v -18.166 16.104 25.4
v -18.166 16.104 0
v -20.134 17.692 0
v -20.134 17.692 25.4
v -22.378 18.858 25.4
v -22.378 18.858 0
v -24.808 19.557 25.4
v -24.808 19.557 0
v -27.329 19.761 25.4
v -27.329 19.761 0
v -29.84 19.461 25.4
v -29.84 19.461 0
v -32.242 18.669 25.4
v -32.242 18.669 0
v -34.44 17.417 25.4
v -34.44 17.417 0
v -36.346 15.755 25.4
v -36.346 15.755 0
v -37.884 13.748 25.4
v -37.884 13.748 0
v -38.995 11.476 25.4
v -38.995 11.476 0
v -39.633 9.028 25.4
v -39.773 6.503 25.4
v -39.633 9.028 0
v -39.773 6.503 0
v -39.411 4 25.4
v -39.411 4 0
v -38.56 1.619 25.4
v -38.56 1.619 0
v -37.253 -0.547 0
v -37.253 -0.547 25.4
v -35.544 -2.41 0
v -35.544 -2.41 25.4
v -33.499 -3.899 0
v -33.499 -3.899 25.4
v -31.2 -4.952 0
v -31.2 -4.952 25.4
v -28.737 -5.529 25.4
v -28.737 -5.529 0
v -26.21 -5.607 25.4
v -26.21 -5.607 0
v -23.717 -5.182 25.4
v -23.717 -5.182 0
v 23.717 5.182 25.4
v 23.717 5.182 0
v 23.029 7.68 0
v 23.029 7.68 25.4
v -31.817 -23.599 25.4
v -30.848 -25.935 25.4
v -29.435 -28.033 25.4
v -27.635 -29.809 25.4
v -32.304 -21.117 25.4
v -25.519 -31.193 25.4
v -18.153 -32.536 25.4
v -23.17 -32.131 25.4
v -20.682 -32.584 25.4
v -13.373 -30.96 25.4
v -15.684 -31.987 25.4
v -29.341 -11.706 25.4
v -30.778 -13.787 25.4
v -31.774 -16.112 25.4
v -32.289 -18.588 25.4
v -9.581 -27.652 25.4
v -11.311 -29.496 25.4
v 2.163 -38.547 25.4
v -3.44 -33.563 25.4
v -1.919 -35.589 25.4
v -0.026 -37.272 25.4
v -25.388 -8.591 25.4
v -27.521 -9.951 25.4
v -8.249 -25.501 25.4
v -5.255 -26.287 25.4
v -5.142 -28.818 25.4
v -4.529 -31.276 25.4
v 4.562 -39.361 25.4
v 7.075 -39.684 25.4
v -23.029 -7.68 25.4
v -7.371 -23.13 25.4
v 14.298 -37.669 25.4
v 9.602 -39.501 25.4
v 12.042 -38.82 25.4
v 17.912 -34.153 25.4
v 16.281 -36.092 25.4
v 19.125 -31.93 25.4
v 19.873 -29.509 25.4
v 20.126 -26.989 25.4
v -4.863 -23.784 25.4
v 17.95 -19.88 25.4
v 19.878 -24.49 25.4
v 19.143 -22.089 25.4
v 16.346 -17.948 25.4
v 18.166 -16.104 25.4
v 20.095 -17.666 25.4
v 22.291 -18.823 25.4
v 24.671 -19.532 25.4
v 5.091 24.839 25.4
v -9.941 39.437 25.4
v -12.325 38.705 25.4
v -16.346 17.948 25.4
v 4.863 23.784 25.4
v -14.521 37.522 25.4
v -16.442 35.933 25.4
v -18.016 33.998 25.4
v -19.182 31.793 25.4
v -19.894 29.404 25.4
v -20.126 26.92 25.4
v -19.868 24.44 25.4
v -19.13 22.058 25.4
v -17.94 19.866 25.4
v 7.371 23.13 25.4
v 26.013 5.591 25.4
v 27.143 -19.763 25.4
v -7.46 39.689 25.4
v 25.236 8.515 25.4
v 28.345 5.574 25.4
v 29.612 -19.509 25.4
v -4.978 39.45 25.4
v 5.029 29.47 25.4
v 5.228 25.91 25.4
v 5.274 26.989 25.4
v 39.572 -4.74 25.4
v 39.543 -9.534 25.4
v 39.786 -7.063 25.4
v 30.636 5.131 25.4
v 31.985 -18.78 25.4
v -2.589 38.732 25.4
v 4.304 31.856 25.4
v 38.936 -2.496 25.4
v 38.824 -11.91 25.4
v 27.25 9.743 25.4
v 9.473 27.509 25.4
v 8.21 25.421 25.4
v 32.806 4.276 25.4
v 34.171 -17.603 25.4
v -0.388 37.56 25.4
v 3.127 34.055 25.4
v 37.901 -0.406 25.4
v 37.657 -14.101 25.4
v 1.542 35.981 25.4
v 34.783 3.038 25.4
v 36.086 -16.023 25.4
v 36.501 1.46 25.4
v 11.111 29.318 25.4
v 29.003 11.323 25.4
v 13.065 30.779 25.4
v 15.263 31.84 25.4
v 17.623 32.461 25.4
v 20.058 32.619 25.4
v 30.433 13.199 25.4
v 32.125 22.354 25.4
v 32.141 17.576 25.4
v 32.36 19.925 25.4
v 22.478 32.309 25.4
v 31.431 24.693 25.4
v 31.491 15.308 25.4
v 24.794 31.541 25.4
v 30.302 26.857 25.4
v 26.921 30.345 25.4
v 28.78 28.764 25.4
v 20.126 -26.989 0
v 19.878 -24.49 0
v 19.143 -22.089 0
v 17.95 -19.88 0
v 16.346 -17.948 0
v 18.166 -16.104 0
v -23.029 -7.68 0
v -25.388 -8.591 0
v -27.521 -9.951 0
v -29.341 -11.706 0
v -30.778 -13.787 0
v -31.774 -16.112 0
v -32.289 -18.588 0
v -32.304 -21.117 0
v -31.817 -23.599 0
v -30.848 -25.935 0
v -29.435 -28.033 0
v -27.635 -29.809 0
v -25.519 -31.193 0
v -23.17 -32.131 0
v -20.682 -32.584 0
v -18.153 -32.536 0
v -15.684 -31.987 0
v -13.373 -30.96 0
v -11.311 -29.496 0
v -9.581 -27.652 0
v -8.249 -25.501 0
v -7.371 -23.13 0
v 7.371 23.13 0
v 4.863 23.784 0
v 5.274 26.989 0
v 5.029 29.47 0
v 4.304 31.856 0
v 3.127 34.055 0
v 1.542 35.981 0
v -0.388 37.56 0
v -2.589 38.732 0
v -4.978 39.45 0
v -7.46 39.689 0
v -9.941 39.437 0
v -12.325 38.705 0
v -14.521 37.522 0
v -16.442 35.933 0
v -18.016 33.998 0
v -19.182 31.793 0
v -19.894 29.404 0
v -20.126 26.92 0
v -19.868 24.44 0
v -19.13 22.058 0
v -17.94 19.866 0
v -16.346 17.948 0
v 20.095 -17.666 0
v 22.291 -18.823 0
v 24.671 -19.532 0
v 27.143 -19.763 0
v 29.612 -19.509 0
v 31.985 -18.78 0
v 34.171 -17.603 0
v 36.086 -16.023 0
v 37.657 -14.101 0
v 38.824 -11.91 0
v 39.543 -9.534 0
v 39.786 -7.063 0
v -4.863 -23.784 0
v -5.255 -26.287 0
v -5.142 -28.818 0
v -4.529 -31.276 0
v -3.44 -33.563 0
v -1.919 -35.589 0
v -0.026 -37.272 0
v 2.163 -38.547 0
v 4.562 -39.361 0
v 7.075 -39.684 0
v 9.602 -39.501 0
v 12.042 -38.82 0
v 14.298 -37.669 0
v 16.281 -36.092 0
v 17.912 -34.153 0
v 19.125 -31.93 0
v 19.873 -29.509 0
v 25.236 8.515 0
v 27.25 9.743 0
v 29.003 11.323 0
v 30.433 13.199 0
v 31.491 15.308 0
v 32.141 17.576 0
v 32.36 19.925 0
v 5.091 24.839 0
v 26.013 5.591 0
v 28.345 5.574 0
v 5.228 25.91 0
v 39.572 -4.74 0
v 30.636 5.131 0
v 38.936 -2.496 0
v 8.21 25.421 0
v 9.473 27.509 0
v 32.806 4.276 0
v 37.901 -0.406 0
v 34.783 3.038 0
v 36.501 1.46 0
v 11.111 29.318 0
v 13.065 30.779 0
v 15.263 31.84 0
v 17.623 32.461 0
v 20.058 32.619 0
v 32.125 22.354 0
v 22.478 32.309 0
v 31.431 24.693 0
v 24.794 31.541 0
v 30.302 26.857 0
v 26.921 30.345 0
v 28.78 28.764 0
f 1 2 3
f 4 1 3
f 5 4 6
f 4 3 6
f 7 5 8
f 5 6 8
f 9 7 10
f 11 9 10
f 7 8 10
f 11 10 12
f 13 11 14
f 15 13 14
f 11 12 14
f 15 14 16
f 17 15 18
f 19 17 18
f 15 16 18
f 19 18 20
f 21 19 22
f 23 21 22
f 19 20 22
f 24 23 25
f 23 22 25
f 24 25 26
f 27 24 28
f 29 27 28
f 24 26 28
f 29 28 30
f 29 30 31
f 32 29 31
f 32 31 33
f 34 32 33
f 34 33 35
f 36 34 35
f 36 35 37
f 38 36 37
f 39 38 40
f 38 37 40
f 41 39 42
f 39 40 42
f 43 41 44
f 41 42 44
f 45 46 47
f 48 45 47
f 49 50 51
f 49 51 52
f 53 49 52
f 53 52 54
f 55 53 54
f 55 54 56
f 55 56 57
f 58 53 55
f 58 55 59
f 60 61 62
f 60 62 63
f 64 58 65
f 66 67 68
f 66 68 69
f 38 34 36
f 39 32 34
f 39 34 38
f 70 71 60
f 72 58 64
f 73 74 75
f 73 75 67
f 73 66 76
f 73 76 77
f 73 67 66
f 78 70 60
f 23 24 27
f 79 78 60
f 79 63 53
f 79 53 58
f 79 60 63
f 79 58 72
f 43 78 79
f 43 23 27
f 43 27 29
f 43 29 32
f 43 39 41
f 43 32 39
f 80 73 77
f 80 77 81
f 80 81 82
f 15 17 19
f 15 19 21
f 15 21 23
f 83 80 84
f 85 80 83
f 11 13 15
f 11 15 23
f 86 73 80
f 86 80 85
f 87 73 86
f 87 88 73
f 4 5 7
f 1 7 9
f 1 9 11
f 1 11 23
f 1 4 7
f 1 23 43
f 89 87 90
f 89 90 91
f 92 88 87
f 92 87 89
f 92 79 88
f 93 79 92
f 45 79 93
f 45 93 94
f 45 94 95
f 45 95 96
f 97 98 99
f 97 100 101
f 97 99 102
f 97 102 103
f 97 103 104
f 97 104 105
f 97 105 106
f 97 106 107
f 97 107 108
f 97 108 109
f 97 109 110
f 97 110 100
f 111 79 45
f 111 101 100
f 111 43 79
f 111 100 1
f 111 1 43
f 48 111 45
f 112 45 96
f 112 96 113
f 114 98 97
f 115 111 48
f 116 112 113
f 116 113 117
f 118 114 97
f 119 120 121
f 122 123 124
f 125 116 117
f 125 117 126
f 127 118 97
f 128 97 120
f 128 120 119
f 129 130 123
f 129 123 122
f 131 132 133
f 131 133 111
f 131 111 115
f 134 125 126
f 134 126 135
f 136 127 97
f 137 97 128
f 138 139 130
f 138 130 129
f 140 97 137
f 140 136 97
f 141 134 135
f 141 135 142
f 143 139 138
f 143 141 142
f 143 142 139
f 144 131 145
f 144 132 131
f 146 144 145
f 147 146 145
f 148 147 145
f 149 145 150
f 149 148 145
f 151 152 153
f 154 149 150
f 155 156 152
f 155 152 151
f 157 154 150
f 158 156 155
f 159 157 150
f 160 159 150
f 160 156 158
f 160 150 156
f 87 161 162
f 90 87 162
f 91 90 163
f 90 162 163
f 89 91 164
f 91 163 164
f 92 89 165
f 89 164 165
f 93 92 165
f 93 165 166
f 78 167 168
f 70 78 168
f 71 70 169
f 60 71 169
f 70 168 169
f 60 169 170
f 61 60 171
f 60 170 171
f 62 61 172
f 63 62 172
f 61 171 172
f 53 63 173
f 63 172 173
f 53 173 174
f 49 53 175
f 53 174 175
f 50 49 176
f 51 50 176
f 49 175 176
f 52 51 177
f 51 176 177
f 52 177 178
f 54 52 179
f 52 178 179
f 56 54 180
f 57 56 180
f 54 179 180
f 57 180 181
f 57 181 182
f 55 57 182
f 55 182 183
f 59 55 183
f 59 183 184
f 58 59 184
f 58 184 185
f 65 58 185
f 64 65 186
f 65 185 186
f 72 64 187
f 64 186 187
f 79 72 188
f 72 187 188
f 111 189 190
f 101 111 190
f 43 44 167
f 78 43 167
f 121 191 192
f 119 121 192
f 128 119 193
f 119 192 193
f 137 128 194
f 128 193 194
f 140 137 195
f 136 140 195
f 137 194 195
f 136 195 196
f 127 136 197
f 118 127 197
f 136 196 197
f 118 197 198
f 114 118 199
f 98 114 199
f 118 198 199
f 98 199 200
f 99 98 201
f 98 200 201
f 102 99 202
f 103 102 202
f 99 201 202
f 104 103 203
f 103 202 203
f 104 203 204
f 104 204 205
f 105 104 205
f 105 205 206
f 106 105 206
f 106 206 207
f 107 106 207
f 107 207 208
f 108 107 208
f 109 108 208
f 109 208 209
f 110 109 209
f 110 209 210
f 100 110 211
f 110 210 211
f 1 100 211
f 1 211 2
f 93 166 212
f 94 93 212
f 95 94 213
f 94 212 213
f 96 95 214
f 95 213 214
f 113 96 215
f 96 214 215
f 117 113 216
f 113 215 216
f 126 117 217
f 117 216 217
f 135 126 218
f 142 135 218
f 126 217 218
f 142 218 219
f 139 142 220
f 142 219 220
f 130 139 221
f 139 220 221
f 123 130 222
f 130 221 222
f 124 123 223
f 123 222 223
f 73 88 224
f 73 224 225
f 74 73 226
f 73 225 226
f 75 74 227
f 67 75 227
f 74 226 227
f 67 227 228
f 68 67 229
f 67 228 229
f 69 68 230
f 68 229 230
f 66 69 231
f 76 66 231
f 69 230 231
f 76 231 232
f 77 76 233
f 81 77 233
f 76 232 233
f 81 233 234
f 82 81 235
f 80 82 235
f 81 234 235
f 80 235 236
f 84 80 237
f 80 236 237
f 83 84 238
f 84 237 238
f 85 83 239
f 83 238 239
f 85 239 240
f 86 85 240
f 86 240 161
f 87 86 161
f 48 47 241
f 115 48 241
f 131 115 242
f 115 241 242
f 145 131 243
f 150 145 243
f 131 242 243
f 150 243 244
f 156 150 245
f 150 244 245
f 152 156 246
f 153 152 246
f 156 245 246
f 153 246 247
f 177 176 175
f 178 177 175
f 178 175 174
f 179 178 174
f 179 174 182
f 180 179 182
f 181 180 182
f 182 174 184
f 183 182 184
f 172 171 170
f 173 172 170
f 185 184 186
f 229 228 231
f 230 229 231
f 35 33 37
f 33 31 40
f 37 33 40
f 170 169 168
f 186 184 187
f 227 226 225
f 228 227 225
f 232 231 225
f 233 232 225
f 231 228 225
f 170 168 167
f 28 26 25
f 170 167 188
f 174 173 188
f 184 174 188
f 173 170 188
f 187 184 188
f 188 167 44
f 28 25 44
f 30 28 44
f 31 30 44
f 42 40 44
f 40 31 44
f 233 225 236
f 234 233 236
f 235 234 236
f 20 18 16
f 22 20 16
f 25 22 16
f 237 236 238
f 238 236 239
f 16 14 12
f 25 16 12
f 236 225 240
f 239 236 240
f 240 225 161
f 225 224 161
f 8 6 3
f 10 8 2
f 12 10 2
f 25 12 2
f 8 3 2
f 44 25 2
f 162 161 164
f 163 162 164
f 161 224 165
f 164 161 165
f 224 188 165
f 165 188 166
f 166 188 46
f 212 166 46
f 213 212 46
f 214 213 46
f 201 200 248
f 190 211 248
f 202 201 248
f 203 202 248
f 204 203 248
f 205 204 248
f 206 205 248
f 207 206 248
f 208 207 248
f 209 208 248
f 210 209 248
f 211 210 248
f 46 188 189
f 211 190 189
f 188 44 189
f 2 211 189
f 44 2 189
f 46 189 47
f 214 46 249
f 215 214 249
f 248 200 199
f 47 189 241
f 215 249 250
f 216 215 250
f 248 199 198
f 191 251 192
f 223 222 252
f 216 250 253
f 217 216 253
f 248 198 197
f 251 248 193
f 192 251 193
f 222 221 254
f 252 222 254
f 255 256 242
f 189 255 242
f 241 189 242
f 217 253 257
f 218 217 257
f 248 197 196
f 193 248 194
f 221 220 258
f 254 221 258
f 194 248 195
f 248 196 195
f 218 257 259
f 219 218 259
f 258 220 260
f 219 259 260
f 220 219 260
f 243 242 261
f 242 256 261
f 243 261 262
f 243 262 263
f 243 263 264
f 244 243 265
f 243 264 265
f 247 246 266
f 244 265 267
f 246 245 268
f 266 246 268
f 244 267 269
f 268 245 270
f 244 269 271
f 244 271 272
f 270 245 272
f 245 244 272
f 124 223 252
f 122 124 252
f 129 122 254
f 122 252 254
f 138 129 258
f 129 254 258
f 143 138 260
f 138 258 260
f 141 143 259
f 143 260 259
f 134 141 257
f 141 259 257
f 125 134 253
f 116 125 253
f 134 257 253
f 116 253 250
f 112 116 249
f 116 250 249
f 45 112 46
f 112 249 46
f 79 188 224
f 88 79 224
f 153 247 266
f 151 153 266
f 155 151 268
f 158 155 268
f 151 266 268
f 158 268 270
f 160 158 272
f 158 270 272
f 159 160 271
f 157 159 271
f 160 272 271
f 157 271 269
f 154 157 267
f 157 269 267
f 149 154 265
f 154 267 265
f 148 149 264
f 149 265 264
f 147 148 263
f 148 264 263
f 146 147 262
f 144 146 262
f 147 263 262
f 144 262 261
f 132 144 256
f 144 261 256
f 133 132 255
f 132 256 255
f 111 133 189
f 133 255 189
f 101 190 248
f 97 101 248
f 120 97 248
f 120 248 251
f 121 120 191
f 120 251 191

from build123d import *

# Parameters (mm, degrees)
F0_R     = 12.7
F1_DEPTH = 25.4


with BuildPart() as f1:
    # F0 (on Top) → F1 (new body)
    with BuildSketch(Plane.XY):
        with BuildLine():
            Line((7.3707728384, 23.1299660417), (4.863097807, 23.7839000386))
            ThreePointArc((4.863097807, 23.7839000386), (-4.0567226722, 14.7436122877), (-16.3457517616, 17.9482595445))
            Line((-16.3457517616, 17.9482595445), (-18.165912731, 16.1035162613))
            ThreePointArc((-18.165912731, 16.1035162613), (-15.3688283269, 11.9626305103), (-14.3857332102, 7.0632285104))
            ThreePointArc((-14.3857332102, 7.0632285104), (-16.9842741732, -0.6342077722), (-23.7165246, -5.1817064972))
            Line((-23.7165246, -5.1817064972), (-23.029010538, -7.6803837773))
            ThreePointArc((-23.029010538, -7.6803837773), (-11.9623656452, -9.823859748), (-6.9598019278, -19.9253187849))
            ThreePointArc((-6.9598019278, -19.9253187849), (-7.0629636452, -21.5407646313), (-7.3707728384, -23.1299660417))
            Line((-7.3707728384, -23.1299660417), (-4.863097807, -23.7839000386))
            ThreePointArc((-4.863097807, -23.7839000386), (4.0567226722, -14.7436122877), (16.3457517616, -17.9482595445))
            Line((16.3457517616, -17.9482595445), (18.165912731, -16.1035162613))
            ThreePointArc((18.165912731, -16.1035162613), (14.7967041208, -3.8585812536), (23.7165246, 5.1817064972))
            Line((23.7165246, 5.1817064972), (23.029010538, 7.6803837773))
            ThreePointArc((23.029010538, 7.6803837773), (10.7399814486, 10.8850310341), (7.3707728384, 23.1299660417))
        make_face()
        Circle(F0_R, mode=Mode.SUBTRACT)
        Circle(F0_R)
        with BuildLine():
            ThreePointArc((39.7857332102, -7.0632285104), (34.7831694928, 3.0382305265), (23.7165246, 5.1817064972))
            Line((23.7165246, 5.1817064972), (27.0857332102, -7.0632285104))
            Line((27.0857332102, -7.0632285104), (18.165912731, -16.1035162613))
            ThreePointArc((18.165912731, -16.1035162613), (31.9851352101, -18.7801333936), (39.7857332102, -7.0632285104))
        make_face()
        with BuildLine():
            ThreePointArc((20.1259312823, -26.9885472953), (19.1428361656, -22.0891452954), (16.3457517616, -17.9482595445))
            Line((16.3457517616, -17.9482595445), (7.4259312823, -26.9885472953))
            Line((7.4259312823, -26.9885472953), (-4.863097807, -23.7839000386))
            ThreePointArc((-4.863097807, -23.7839000386), (5.810485436, -39.5853855779), (20.1259312823, -26.9885472953))
        make_face()
        with BuildLine():
            Line((-27.0857332102, 7.0632285104), (-18.165912731, 16.1035162613))
            ThreePointArc((-18.165912731, 16.1035162613), (-39.3747622996, 10.2678757672), (-23.7165246, -5.1817064972))
            Line((-23.7165246, -5.1817064972), (-27.0857332102, 7.0632285104))
        make_face()
        with BuildLine():
            ThreePointArc((32.3598019278, 19.9253187849), (21.2752477741, 32.5221570675), (7.3707728384, 23.1299660417))
            Line((7.3707728384, 23.1299660417), (19.6598019278, 19.9253187849))
            Line((19.6598019278, 19.9253187849), (23.029010538, 7.6803837773))
            ThreePointArc((23.029010538, 7.6803837773), (29.7612609647, 12.2278825023), (32.3598019278, 19.9253187849))
        make_face()
        with BuildLine():
            Line((-16.3457517616, 17.9482595445), (-7.4259312823, 26.9885472953))
            Line((-7.4259312823, 26.9885472953), (4.863097807, 23.7839000386))
            ThreePointArc((4.863097807, 23.7839000386), (5.1709070002, 25.373101449), (5.2740687177, 26.9885472953))
            ThreePointArc((5.2740687177, 26.9885472953), (-12.3253332823, 38.7054521786), (-16.3457517616, 17.9482595445))
        make_face()
        with BuildLine():
            Line((-19.6598019278, -19.9253187849), (-23.029010538, -7.6803837773))
            ThreePointArc((-23.029010538, -7.6803837773), (-28.579622407, -28.9656065358), (-7.3707728384, -23.1299660417))
            Line((-7.3707728384, -23.1299660417), (-19.6598019278, -19.9253187849))
        make_face()
        with BuildLine():
            Line((4.863097807, 23.7839000386), (-7.4259312823, 26.9885472953))
            Line((-7.4259312823, 26.9885472953), (-16.3457517616, 17.9482595445))
            ThreePointArc((-16.3457517616, 17.9482595445), (-4.0567226722, 14.7436122877), (4.863097807, 23.7839000386))
        make_face()
        with BuildLine():
            Line((27.0857332102, -7.0632285104), (23.7165246, 5.1817064972))
            ThreePointArc((23.7165246, 5.1817064972), (14.7967041208, -3.8585812536), (18.165912731, -16.1035162613))
            Line((18.165912731, -16.1035162613), (27.0857332102, -7.0632285104))
        make_face()
        with BuildLine():
            Line((19.6598019278, 19.9253187849), (7.3707728384, 23.1299660417))
            ThreePointArc((7.3707728384, 23.1299660417), (10.7399814486, 10.8850310341), (23.029010538, 7.6803837773))
            Line((23.029010538, 7.6803837773), (19.6598019278, 19.9253187849))
        make_face()
        with BuildLine():
            ThreePointArc((-14.3857332102, 7.0632285104), (-15.3688283269, 11.9626305103), (-18.165912731, 16.1035162613))
            Line((-18.165912731, 16.1035162613), (-27.0857332102, 7.0632285104))
            Line((-27.0857332102, 7.0632285104), (-23.7165246, -5.1817064972))
            ThreePointArc((-23.7165246, -5.1817064972), (-16.9842741732, -0.6342077722), (-14.3857332102, 7.0632285104))
        make_face()
        with BuildLine():
            ThreePointArc((-6.9598019278, -19.9253187849), (-11.9623656452, -9.823859748), (-23.029010538, -7.6803837773))
            Line((-23.029010538, -7.6803837773), (-19.6598019278, -19.9253187849))
            Line((-19.6598019278, -19.9253187849), (-7.3707728384, -23.1299660417))
            ThreePointArc((-7.3707728384, -23.1299660417), (-7.0629636452, -21.5407646313), (-6.9598019278, -19.9253187849))
        make_face()
        with BuildLine():
            Line((7.4259312823, -26.9885472953), (16.3457517616, -17.9482595445))
            ThreePointArc((16.3457517616, -17.9482595445), (4.0567226722, -14.7436122877), (-4.863097807, -23.7839000386))
            Line((-4.863097807, -23.7839000386), (7.4259312823, -26.9885472953))
        make_face()
    extrude(amount=F1_DEPTH)


solid = f1.part
